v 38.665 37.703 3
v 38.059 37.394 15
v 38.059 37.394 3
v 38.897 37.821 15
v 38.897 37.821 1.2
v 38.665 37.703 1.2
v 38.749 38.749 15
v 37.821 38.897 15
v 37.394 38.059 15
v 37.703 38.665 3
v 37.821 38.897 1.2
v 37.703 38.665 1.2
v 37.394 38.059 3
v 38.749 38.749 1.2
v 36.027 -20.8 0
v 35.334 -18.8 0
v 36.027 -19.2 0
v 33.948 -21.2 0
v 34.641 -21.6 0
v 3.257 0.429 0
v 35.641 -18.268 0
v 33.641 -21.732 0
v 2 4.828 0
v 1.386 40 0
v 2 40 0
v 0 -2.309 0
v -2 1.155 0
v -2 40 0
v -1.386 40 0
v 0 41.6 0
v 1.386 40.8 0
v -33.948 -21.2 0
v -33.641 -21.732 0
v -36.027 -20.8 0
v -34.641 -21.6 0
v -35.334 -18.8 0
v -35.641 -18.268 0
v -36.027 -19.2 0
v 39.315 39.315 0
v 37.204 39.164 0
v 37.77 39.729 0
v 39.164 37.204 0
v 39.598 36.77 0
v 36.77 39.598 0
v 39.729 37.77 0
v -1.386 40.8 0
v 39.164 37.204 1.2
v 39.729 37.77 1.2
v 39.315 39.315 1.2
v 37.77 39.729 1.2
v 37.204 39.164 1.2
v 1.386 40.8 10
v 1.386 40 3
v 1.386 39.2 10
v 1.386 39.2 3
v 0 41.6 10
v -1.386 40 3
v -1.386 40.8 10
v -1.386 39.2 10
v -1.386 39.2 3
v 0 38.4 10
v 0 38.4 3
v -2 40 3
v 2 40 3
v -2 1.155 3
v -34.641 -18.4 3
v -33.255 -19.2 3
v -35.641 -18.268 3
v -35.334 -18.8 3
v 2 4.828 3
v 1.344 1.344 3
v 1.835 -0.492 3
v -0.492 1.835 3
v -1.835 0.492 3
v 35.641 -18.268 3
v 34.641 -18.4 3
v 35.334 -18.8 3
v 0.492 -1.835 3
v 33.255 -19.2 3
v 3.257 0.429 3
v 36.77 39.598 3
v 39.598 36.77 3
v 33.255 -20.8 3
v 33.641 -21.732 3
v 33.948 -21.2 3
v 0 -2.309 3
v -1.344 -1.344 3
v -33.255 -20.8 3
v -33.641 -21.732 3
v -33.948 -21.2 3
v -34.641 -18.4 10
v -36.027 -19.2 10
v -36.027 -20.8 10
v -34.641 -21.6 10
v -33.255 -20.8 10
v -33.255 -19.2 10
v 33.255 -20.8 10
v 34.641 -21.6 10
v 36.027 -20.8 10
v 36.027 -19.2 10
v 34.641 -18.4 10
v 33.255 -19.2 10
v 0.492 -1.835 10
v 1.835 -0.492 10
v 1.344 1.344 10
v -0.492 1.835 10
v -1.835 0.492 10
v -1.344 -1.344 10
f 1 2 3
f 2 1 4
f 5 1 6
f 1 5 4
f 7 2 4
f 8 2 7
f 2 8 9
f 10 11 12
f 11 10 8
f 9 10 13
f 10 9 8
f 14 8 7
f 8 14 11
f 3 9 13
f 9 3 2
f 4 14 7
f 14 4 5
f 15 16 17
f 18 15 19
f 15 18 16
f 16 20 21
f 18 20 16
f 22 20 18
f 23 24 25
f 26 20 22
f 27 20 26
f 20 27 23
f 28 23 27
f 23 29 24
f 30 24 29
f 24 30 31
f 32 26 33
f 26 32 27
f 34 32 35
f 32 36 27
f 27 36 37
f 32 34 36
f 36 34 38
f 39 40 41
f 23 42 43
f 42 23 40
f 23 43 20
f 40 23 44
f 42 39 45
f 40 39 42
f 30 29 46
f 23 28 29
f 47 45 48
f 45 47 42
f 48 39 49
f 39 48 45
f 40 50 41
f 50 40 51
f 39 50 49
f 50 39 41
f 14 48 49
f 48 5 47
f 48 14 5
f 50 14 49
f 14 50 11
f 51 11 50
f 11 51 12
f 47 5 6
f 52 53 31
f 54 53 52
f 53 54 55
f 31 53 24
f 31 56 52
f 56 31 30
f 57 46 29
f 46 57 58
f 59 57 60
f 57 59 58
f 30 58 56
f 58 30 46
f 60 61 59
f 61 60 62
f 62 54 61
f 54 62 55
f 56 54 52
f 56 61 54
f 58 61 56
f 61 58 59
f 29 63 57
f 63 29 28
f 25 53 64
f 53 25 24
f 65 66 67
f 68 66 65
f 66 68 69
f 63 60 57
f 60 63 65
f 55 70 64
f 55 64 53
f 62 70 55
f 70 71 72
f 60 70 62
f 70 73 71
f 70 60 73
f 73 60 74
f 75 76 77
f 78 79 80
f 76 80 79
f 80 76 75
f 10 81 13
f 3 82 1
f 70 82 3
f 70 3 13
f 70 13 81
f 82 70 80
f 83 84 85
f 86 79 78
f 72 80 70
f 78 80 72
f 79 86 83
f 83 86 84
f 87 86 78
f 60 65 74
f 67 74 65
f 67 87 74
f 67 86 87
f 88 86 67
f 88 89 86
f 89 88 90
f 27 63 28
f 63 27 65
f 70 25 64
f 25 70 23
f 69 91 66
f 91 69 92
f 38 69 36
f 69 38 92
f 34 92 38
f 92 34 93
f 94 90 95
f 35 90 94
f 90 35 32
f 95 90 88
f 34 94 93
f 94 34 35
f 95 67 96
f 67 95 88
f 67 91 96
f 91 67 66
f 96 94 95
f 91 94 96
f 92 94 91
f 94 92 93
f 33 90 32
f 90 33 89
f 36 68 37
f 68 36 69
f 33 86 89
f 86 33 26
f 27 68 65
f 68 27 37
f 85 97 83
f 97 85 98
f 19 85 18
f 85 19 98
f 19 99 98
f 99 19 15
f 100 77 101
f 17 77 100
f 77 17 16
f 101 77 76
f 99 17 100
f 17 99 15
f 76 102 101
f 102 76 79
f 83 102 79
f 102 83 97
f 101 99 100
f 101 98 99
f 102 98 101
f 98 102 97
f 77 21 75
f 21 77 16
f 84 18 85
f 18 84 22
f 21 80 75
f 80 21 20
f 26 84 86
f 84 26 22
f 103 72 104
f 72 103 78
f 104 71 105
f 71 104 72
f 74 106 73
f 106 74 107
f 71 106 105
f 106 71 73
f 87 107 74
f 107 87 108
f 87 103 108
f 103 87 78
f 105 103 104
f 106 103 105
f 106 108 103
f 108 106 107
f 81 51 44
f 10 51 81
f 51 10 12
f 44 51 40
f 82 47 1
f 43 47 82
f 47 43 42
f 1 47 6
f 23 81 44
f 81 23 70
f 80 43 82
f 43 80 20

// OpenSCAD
// [FL_INDEX: keywords="openscad, 3d_parametric, Key_Tray, csg_solid" | COT="Parametric OpenSCAD design from 3DCodeverse"]
// Title: Key Tray

//Made by Timmytool


//variables
//diamiter of the centre hole, in mm
centreD=3.8;
//total hight of the centre spire 
centreH=10;
//steam vent diamiter
steamventD=1.6;
//distance between the centre hole and the steam vent hole (centre to centre), in mm
steamventT=54;
//steam vent hight, make higher then the centre hight, if to take you can clip it with plyers/standley knife 
steamventH=15;
//keeping this the same as the centre hight seems to work well
bowlsupportH=10;
//the larger this is the more stable the "pan",take in to consideration 3d printer platform space.
bowlsupportT=40;


layerhight=0.2+1-1;

//calculations
centreR=centreD/2;
steamventR=steamventD/2;
steamventE=steamventR*2;
mikiears=layerhight*6;

rotate([0,0,45]){

cylinder(centreH,centreR,centreR);	//centre

translate([steamventT,0,0]){			//steam vent
	cylinder(steamventH,steamventR,steamventR);
	cylinder(mikiears,steamventE,steamventE);}
	translate([0,-2,0])cube([54,4,3]);

rotate([0,0,45]){						//bowl support1
	translate([bowlsupportT,0,0]){
		cylinder(bowlsupportH,steamventD,steamventD);
		cylinder(mikiears,steamventD,steamventE);}
	translate([0,-2,0])cube([bowlsupportT,4,3]);}

rotate([0,0,165]){					//bowl support2
	translate([bowlsupportT,0,0]){
		cylinder(bowlsupportH,steamventD,steamventD);
		cylinder(mikiears,steamventD,steamventE);}
	translate([0,-2,0])cube([bowlsupportT,4,3]);}

rotate([0,0,285]){					//bowl support3
	translate([bowlsupportT,0,0]){
		cylinder(bowlsupportH,steamventD,steamventD);
		cylinder(mikiears,steamventD,steamventE);}
	translate([0,-2,0])cube([bowlsupportT,4,3]);}
}
